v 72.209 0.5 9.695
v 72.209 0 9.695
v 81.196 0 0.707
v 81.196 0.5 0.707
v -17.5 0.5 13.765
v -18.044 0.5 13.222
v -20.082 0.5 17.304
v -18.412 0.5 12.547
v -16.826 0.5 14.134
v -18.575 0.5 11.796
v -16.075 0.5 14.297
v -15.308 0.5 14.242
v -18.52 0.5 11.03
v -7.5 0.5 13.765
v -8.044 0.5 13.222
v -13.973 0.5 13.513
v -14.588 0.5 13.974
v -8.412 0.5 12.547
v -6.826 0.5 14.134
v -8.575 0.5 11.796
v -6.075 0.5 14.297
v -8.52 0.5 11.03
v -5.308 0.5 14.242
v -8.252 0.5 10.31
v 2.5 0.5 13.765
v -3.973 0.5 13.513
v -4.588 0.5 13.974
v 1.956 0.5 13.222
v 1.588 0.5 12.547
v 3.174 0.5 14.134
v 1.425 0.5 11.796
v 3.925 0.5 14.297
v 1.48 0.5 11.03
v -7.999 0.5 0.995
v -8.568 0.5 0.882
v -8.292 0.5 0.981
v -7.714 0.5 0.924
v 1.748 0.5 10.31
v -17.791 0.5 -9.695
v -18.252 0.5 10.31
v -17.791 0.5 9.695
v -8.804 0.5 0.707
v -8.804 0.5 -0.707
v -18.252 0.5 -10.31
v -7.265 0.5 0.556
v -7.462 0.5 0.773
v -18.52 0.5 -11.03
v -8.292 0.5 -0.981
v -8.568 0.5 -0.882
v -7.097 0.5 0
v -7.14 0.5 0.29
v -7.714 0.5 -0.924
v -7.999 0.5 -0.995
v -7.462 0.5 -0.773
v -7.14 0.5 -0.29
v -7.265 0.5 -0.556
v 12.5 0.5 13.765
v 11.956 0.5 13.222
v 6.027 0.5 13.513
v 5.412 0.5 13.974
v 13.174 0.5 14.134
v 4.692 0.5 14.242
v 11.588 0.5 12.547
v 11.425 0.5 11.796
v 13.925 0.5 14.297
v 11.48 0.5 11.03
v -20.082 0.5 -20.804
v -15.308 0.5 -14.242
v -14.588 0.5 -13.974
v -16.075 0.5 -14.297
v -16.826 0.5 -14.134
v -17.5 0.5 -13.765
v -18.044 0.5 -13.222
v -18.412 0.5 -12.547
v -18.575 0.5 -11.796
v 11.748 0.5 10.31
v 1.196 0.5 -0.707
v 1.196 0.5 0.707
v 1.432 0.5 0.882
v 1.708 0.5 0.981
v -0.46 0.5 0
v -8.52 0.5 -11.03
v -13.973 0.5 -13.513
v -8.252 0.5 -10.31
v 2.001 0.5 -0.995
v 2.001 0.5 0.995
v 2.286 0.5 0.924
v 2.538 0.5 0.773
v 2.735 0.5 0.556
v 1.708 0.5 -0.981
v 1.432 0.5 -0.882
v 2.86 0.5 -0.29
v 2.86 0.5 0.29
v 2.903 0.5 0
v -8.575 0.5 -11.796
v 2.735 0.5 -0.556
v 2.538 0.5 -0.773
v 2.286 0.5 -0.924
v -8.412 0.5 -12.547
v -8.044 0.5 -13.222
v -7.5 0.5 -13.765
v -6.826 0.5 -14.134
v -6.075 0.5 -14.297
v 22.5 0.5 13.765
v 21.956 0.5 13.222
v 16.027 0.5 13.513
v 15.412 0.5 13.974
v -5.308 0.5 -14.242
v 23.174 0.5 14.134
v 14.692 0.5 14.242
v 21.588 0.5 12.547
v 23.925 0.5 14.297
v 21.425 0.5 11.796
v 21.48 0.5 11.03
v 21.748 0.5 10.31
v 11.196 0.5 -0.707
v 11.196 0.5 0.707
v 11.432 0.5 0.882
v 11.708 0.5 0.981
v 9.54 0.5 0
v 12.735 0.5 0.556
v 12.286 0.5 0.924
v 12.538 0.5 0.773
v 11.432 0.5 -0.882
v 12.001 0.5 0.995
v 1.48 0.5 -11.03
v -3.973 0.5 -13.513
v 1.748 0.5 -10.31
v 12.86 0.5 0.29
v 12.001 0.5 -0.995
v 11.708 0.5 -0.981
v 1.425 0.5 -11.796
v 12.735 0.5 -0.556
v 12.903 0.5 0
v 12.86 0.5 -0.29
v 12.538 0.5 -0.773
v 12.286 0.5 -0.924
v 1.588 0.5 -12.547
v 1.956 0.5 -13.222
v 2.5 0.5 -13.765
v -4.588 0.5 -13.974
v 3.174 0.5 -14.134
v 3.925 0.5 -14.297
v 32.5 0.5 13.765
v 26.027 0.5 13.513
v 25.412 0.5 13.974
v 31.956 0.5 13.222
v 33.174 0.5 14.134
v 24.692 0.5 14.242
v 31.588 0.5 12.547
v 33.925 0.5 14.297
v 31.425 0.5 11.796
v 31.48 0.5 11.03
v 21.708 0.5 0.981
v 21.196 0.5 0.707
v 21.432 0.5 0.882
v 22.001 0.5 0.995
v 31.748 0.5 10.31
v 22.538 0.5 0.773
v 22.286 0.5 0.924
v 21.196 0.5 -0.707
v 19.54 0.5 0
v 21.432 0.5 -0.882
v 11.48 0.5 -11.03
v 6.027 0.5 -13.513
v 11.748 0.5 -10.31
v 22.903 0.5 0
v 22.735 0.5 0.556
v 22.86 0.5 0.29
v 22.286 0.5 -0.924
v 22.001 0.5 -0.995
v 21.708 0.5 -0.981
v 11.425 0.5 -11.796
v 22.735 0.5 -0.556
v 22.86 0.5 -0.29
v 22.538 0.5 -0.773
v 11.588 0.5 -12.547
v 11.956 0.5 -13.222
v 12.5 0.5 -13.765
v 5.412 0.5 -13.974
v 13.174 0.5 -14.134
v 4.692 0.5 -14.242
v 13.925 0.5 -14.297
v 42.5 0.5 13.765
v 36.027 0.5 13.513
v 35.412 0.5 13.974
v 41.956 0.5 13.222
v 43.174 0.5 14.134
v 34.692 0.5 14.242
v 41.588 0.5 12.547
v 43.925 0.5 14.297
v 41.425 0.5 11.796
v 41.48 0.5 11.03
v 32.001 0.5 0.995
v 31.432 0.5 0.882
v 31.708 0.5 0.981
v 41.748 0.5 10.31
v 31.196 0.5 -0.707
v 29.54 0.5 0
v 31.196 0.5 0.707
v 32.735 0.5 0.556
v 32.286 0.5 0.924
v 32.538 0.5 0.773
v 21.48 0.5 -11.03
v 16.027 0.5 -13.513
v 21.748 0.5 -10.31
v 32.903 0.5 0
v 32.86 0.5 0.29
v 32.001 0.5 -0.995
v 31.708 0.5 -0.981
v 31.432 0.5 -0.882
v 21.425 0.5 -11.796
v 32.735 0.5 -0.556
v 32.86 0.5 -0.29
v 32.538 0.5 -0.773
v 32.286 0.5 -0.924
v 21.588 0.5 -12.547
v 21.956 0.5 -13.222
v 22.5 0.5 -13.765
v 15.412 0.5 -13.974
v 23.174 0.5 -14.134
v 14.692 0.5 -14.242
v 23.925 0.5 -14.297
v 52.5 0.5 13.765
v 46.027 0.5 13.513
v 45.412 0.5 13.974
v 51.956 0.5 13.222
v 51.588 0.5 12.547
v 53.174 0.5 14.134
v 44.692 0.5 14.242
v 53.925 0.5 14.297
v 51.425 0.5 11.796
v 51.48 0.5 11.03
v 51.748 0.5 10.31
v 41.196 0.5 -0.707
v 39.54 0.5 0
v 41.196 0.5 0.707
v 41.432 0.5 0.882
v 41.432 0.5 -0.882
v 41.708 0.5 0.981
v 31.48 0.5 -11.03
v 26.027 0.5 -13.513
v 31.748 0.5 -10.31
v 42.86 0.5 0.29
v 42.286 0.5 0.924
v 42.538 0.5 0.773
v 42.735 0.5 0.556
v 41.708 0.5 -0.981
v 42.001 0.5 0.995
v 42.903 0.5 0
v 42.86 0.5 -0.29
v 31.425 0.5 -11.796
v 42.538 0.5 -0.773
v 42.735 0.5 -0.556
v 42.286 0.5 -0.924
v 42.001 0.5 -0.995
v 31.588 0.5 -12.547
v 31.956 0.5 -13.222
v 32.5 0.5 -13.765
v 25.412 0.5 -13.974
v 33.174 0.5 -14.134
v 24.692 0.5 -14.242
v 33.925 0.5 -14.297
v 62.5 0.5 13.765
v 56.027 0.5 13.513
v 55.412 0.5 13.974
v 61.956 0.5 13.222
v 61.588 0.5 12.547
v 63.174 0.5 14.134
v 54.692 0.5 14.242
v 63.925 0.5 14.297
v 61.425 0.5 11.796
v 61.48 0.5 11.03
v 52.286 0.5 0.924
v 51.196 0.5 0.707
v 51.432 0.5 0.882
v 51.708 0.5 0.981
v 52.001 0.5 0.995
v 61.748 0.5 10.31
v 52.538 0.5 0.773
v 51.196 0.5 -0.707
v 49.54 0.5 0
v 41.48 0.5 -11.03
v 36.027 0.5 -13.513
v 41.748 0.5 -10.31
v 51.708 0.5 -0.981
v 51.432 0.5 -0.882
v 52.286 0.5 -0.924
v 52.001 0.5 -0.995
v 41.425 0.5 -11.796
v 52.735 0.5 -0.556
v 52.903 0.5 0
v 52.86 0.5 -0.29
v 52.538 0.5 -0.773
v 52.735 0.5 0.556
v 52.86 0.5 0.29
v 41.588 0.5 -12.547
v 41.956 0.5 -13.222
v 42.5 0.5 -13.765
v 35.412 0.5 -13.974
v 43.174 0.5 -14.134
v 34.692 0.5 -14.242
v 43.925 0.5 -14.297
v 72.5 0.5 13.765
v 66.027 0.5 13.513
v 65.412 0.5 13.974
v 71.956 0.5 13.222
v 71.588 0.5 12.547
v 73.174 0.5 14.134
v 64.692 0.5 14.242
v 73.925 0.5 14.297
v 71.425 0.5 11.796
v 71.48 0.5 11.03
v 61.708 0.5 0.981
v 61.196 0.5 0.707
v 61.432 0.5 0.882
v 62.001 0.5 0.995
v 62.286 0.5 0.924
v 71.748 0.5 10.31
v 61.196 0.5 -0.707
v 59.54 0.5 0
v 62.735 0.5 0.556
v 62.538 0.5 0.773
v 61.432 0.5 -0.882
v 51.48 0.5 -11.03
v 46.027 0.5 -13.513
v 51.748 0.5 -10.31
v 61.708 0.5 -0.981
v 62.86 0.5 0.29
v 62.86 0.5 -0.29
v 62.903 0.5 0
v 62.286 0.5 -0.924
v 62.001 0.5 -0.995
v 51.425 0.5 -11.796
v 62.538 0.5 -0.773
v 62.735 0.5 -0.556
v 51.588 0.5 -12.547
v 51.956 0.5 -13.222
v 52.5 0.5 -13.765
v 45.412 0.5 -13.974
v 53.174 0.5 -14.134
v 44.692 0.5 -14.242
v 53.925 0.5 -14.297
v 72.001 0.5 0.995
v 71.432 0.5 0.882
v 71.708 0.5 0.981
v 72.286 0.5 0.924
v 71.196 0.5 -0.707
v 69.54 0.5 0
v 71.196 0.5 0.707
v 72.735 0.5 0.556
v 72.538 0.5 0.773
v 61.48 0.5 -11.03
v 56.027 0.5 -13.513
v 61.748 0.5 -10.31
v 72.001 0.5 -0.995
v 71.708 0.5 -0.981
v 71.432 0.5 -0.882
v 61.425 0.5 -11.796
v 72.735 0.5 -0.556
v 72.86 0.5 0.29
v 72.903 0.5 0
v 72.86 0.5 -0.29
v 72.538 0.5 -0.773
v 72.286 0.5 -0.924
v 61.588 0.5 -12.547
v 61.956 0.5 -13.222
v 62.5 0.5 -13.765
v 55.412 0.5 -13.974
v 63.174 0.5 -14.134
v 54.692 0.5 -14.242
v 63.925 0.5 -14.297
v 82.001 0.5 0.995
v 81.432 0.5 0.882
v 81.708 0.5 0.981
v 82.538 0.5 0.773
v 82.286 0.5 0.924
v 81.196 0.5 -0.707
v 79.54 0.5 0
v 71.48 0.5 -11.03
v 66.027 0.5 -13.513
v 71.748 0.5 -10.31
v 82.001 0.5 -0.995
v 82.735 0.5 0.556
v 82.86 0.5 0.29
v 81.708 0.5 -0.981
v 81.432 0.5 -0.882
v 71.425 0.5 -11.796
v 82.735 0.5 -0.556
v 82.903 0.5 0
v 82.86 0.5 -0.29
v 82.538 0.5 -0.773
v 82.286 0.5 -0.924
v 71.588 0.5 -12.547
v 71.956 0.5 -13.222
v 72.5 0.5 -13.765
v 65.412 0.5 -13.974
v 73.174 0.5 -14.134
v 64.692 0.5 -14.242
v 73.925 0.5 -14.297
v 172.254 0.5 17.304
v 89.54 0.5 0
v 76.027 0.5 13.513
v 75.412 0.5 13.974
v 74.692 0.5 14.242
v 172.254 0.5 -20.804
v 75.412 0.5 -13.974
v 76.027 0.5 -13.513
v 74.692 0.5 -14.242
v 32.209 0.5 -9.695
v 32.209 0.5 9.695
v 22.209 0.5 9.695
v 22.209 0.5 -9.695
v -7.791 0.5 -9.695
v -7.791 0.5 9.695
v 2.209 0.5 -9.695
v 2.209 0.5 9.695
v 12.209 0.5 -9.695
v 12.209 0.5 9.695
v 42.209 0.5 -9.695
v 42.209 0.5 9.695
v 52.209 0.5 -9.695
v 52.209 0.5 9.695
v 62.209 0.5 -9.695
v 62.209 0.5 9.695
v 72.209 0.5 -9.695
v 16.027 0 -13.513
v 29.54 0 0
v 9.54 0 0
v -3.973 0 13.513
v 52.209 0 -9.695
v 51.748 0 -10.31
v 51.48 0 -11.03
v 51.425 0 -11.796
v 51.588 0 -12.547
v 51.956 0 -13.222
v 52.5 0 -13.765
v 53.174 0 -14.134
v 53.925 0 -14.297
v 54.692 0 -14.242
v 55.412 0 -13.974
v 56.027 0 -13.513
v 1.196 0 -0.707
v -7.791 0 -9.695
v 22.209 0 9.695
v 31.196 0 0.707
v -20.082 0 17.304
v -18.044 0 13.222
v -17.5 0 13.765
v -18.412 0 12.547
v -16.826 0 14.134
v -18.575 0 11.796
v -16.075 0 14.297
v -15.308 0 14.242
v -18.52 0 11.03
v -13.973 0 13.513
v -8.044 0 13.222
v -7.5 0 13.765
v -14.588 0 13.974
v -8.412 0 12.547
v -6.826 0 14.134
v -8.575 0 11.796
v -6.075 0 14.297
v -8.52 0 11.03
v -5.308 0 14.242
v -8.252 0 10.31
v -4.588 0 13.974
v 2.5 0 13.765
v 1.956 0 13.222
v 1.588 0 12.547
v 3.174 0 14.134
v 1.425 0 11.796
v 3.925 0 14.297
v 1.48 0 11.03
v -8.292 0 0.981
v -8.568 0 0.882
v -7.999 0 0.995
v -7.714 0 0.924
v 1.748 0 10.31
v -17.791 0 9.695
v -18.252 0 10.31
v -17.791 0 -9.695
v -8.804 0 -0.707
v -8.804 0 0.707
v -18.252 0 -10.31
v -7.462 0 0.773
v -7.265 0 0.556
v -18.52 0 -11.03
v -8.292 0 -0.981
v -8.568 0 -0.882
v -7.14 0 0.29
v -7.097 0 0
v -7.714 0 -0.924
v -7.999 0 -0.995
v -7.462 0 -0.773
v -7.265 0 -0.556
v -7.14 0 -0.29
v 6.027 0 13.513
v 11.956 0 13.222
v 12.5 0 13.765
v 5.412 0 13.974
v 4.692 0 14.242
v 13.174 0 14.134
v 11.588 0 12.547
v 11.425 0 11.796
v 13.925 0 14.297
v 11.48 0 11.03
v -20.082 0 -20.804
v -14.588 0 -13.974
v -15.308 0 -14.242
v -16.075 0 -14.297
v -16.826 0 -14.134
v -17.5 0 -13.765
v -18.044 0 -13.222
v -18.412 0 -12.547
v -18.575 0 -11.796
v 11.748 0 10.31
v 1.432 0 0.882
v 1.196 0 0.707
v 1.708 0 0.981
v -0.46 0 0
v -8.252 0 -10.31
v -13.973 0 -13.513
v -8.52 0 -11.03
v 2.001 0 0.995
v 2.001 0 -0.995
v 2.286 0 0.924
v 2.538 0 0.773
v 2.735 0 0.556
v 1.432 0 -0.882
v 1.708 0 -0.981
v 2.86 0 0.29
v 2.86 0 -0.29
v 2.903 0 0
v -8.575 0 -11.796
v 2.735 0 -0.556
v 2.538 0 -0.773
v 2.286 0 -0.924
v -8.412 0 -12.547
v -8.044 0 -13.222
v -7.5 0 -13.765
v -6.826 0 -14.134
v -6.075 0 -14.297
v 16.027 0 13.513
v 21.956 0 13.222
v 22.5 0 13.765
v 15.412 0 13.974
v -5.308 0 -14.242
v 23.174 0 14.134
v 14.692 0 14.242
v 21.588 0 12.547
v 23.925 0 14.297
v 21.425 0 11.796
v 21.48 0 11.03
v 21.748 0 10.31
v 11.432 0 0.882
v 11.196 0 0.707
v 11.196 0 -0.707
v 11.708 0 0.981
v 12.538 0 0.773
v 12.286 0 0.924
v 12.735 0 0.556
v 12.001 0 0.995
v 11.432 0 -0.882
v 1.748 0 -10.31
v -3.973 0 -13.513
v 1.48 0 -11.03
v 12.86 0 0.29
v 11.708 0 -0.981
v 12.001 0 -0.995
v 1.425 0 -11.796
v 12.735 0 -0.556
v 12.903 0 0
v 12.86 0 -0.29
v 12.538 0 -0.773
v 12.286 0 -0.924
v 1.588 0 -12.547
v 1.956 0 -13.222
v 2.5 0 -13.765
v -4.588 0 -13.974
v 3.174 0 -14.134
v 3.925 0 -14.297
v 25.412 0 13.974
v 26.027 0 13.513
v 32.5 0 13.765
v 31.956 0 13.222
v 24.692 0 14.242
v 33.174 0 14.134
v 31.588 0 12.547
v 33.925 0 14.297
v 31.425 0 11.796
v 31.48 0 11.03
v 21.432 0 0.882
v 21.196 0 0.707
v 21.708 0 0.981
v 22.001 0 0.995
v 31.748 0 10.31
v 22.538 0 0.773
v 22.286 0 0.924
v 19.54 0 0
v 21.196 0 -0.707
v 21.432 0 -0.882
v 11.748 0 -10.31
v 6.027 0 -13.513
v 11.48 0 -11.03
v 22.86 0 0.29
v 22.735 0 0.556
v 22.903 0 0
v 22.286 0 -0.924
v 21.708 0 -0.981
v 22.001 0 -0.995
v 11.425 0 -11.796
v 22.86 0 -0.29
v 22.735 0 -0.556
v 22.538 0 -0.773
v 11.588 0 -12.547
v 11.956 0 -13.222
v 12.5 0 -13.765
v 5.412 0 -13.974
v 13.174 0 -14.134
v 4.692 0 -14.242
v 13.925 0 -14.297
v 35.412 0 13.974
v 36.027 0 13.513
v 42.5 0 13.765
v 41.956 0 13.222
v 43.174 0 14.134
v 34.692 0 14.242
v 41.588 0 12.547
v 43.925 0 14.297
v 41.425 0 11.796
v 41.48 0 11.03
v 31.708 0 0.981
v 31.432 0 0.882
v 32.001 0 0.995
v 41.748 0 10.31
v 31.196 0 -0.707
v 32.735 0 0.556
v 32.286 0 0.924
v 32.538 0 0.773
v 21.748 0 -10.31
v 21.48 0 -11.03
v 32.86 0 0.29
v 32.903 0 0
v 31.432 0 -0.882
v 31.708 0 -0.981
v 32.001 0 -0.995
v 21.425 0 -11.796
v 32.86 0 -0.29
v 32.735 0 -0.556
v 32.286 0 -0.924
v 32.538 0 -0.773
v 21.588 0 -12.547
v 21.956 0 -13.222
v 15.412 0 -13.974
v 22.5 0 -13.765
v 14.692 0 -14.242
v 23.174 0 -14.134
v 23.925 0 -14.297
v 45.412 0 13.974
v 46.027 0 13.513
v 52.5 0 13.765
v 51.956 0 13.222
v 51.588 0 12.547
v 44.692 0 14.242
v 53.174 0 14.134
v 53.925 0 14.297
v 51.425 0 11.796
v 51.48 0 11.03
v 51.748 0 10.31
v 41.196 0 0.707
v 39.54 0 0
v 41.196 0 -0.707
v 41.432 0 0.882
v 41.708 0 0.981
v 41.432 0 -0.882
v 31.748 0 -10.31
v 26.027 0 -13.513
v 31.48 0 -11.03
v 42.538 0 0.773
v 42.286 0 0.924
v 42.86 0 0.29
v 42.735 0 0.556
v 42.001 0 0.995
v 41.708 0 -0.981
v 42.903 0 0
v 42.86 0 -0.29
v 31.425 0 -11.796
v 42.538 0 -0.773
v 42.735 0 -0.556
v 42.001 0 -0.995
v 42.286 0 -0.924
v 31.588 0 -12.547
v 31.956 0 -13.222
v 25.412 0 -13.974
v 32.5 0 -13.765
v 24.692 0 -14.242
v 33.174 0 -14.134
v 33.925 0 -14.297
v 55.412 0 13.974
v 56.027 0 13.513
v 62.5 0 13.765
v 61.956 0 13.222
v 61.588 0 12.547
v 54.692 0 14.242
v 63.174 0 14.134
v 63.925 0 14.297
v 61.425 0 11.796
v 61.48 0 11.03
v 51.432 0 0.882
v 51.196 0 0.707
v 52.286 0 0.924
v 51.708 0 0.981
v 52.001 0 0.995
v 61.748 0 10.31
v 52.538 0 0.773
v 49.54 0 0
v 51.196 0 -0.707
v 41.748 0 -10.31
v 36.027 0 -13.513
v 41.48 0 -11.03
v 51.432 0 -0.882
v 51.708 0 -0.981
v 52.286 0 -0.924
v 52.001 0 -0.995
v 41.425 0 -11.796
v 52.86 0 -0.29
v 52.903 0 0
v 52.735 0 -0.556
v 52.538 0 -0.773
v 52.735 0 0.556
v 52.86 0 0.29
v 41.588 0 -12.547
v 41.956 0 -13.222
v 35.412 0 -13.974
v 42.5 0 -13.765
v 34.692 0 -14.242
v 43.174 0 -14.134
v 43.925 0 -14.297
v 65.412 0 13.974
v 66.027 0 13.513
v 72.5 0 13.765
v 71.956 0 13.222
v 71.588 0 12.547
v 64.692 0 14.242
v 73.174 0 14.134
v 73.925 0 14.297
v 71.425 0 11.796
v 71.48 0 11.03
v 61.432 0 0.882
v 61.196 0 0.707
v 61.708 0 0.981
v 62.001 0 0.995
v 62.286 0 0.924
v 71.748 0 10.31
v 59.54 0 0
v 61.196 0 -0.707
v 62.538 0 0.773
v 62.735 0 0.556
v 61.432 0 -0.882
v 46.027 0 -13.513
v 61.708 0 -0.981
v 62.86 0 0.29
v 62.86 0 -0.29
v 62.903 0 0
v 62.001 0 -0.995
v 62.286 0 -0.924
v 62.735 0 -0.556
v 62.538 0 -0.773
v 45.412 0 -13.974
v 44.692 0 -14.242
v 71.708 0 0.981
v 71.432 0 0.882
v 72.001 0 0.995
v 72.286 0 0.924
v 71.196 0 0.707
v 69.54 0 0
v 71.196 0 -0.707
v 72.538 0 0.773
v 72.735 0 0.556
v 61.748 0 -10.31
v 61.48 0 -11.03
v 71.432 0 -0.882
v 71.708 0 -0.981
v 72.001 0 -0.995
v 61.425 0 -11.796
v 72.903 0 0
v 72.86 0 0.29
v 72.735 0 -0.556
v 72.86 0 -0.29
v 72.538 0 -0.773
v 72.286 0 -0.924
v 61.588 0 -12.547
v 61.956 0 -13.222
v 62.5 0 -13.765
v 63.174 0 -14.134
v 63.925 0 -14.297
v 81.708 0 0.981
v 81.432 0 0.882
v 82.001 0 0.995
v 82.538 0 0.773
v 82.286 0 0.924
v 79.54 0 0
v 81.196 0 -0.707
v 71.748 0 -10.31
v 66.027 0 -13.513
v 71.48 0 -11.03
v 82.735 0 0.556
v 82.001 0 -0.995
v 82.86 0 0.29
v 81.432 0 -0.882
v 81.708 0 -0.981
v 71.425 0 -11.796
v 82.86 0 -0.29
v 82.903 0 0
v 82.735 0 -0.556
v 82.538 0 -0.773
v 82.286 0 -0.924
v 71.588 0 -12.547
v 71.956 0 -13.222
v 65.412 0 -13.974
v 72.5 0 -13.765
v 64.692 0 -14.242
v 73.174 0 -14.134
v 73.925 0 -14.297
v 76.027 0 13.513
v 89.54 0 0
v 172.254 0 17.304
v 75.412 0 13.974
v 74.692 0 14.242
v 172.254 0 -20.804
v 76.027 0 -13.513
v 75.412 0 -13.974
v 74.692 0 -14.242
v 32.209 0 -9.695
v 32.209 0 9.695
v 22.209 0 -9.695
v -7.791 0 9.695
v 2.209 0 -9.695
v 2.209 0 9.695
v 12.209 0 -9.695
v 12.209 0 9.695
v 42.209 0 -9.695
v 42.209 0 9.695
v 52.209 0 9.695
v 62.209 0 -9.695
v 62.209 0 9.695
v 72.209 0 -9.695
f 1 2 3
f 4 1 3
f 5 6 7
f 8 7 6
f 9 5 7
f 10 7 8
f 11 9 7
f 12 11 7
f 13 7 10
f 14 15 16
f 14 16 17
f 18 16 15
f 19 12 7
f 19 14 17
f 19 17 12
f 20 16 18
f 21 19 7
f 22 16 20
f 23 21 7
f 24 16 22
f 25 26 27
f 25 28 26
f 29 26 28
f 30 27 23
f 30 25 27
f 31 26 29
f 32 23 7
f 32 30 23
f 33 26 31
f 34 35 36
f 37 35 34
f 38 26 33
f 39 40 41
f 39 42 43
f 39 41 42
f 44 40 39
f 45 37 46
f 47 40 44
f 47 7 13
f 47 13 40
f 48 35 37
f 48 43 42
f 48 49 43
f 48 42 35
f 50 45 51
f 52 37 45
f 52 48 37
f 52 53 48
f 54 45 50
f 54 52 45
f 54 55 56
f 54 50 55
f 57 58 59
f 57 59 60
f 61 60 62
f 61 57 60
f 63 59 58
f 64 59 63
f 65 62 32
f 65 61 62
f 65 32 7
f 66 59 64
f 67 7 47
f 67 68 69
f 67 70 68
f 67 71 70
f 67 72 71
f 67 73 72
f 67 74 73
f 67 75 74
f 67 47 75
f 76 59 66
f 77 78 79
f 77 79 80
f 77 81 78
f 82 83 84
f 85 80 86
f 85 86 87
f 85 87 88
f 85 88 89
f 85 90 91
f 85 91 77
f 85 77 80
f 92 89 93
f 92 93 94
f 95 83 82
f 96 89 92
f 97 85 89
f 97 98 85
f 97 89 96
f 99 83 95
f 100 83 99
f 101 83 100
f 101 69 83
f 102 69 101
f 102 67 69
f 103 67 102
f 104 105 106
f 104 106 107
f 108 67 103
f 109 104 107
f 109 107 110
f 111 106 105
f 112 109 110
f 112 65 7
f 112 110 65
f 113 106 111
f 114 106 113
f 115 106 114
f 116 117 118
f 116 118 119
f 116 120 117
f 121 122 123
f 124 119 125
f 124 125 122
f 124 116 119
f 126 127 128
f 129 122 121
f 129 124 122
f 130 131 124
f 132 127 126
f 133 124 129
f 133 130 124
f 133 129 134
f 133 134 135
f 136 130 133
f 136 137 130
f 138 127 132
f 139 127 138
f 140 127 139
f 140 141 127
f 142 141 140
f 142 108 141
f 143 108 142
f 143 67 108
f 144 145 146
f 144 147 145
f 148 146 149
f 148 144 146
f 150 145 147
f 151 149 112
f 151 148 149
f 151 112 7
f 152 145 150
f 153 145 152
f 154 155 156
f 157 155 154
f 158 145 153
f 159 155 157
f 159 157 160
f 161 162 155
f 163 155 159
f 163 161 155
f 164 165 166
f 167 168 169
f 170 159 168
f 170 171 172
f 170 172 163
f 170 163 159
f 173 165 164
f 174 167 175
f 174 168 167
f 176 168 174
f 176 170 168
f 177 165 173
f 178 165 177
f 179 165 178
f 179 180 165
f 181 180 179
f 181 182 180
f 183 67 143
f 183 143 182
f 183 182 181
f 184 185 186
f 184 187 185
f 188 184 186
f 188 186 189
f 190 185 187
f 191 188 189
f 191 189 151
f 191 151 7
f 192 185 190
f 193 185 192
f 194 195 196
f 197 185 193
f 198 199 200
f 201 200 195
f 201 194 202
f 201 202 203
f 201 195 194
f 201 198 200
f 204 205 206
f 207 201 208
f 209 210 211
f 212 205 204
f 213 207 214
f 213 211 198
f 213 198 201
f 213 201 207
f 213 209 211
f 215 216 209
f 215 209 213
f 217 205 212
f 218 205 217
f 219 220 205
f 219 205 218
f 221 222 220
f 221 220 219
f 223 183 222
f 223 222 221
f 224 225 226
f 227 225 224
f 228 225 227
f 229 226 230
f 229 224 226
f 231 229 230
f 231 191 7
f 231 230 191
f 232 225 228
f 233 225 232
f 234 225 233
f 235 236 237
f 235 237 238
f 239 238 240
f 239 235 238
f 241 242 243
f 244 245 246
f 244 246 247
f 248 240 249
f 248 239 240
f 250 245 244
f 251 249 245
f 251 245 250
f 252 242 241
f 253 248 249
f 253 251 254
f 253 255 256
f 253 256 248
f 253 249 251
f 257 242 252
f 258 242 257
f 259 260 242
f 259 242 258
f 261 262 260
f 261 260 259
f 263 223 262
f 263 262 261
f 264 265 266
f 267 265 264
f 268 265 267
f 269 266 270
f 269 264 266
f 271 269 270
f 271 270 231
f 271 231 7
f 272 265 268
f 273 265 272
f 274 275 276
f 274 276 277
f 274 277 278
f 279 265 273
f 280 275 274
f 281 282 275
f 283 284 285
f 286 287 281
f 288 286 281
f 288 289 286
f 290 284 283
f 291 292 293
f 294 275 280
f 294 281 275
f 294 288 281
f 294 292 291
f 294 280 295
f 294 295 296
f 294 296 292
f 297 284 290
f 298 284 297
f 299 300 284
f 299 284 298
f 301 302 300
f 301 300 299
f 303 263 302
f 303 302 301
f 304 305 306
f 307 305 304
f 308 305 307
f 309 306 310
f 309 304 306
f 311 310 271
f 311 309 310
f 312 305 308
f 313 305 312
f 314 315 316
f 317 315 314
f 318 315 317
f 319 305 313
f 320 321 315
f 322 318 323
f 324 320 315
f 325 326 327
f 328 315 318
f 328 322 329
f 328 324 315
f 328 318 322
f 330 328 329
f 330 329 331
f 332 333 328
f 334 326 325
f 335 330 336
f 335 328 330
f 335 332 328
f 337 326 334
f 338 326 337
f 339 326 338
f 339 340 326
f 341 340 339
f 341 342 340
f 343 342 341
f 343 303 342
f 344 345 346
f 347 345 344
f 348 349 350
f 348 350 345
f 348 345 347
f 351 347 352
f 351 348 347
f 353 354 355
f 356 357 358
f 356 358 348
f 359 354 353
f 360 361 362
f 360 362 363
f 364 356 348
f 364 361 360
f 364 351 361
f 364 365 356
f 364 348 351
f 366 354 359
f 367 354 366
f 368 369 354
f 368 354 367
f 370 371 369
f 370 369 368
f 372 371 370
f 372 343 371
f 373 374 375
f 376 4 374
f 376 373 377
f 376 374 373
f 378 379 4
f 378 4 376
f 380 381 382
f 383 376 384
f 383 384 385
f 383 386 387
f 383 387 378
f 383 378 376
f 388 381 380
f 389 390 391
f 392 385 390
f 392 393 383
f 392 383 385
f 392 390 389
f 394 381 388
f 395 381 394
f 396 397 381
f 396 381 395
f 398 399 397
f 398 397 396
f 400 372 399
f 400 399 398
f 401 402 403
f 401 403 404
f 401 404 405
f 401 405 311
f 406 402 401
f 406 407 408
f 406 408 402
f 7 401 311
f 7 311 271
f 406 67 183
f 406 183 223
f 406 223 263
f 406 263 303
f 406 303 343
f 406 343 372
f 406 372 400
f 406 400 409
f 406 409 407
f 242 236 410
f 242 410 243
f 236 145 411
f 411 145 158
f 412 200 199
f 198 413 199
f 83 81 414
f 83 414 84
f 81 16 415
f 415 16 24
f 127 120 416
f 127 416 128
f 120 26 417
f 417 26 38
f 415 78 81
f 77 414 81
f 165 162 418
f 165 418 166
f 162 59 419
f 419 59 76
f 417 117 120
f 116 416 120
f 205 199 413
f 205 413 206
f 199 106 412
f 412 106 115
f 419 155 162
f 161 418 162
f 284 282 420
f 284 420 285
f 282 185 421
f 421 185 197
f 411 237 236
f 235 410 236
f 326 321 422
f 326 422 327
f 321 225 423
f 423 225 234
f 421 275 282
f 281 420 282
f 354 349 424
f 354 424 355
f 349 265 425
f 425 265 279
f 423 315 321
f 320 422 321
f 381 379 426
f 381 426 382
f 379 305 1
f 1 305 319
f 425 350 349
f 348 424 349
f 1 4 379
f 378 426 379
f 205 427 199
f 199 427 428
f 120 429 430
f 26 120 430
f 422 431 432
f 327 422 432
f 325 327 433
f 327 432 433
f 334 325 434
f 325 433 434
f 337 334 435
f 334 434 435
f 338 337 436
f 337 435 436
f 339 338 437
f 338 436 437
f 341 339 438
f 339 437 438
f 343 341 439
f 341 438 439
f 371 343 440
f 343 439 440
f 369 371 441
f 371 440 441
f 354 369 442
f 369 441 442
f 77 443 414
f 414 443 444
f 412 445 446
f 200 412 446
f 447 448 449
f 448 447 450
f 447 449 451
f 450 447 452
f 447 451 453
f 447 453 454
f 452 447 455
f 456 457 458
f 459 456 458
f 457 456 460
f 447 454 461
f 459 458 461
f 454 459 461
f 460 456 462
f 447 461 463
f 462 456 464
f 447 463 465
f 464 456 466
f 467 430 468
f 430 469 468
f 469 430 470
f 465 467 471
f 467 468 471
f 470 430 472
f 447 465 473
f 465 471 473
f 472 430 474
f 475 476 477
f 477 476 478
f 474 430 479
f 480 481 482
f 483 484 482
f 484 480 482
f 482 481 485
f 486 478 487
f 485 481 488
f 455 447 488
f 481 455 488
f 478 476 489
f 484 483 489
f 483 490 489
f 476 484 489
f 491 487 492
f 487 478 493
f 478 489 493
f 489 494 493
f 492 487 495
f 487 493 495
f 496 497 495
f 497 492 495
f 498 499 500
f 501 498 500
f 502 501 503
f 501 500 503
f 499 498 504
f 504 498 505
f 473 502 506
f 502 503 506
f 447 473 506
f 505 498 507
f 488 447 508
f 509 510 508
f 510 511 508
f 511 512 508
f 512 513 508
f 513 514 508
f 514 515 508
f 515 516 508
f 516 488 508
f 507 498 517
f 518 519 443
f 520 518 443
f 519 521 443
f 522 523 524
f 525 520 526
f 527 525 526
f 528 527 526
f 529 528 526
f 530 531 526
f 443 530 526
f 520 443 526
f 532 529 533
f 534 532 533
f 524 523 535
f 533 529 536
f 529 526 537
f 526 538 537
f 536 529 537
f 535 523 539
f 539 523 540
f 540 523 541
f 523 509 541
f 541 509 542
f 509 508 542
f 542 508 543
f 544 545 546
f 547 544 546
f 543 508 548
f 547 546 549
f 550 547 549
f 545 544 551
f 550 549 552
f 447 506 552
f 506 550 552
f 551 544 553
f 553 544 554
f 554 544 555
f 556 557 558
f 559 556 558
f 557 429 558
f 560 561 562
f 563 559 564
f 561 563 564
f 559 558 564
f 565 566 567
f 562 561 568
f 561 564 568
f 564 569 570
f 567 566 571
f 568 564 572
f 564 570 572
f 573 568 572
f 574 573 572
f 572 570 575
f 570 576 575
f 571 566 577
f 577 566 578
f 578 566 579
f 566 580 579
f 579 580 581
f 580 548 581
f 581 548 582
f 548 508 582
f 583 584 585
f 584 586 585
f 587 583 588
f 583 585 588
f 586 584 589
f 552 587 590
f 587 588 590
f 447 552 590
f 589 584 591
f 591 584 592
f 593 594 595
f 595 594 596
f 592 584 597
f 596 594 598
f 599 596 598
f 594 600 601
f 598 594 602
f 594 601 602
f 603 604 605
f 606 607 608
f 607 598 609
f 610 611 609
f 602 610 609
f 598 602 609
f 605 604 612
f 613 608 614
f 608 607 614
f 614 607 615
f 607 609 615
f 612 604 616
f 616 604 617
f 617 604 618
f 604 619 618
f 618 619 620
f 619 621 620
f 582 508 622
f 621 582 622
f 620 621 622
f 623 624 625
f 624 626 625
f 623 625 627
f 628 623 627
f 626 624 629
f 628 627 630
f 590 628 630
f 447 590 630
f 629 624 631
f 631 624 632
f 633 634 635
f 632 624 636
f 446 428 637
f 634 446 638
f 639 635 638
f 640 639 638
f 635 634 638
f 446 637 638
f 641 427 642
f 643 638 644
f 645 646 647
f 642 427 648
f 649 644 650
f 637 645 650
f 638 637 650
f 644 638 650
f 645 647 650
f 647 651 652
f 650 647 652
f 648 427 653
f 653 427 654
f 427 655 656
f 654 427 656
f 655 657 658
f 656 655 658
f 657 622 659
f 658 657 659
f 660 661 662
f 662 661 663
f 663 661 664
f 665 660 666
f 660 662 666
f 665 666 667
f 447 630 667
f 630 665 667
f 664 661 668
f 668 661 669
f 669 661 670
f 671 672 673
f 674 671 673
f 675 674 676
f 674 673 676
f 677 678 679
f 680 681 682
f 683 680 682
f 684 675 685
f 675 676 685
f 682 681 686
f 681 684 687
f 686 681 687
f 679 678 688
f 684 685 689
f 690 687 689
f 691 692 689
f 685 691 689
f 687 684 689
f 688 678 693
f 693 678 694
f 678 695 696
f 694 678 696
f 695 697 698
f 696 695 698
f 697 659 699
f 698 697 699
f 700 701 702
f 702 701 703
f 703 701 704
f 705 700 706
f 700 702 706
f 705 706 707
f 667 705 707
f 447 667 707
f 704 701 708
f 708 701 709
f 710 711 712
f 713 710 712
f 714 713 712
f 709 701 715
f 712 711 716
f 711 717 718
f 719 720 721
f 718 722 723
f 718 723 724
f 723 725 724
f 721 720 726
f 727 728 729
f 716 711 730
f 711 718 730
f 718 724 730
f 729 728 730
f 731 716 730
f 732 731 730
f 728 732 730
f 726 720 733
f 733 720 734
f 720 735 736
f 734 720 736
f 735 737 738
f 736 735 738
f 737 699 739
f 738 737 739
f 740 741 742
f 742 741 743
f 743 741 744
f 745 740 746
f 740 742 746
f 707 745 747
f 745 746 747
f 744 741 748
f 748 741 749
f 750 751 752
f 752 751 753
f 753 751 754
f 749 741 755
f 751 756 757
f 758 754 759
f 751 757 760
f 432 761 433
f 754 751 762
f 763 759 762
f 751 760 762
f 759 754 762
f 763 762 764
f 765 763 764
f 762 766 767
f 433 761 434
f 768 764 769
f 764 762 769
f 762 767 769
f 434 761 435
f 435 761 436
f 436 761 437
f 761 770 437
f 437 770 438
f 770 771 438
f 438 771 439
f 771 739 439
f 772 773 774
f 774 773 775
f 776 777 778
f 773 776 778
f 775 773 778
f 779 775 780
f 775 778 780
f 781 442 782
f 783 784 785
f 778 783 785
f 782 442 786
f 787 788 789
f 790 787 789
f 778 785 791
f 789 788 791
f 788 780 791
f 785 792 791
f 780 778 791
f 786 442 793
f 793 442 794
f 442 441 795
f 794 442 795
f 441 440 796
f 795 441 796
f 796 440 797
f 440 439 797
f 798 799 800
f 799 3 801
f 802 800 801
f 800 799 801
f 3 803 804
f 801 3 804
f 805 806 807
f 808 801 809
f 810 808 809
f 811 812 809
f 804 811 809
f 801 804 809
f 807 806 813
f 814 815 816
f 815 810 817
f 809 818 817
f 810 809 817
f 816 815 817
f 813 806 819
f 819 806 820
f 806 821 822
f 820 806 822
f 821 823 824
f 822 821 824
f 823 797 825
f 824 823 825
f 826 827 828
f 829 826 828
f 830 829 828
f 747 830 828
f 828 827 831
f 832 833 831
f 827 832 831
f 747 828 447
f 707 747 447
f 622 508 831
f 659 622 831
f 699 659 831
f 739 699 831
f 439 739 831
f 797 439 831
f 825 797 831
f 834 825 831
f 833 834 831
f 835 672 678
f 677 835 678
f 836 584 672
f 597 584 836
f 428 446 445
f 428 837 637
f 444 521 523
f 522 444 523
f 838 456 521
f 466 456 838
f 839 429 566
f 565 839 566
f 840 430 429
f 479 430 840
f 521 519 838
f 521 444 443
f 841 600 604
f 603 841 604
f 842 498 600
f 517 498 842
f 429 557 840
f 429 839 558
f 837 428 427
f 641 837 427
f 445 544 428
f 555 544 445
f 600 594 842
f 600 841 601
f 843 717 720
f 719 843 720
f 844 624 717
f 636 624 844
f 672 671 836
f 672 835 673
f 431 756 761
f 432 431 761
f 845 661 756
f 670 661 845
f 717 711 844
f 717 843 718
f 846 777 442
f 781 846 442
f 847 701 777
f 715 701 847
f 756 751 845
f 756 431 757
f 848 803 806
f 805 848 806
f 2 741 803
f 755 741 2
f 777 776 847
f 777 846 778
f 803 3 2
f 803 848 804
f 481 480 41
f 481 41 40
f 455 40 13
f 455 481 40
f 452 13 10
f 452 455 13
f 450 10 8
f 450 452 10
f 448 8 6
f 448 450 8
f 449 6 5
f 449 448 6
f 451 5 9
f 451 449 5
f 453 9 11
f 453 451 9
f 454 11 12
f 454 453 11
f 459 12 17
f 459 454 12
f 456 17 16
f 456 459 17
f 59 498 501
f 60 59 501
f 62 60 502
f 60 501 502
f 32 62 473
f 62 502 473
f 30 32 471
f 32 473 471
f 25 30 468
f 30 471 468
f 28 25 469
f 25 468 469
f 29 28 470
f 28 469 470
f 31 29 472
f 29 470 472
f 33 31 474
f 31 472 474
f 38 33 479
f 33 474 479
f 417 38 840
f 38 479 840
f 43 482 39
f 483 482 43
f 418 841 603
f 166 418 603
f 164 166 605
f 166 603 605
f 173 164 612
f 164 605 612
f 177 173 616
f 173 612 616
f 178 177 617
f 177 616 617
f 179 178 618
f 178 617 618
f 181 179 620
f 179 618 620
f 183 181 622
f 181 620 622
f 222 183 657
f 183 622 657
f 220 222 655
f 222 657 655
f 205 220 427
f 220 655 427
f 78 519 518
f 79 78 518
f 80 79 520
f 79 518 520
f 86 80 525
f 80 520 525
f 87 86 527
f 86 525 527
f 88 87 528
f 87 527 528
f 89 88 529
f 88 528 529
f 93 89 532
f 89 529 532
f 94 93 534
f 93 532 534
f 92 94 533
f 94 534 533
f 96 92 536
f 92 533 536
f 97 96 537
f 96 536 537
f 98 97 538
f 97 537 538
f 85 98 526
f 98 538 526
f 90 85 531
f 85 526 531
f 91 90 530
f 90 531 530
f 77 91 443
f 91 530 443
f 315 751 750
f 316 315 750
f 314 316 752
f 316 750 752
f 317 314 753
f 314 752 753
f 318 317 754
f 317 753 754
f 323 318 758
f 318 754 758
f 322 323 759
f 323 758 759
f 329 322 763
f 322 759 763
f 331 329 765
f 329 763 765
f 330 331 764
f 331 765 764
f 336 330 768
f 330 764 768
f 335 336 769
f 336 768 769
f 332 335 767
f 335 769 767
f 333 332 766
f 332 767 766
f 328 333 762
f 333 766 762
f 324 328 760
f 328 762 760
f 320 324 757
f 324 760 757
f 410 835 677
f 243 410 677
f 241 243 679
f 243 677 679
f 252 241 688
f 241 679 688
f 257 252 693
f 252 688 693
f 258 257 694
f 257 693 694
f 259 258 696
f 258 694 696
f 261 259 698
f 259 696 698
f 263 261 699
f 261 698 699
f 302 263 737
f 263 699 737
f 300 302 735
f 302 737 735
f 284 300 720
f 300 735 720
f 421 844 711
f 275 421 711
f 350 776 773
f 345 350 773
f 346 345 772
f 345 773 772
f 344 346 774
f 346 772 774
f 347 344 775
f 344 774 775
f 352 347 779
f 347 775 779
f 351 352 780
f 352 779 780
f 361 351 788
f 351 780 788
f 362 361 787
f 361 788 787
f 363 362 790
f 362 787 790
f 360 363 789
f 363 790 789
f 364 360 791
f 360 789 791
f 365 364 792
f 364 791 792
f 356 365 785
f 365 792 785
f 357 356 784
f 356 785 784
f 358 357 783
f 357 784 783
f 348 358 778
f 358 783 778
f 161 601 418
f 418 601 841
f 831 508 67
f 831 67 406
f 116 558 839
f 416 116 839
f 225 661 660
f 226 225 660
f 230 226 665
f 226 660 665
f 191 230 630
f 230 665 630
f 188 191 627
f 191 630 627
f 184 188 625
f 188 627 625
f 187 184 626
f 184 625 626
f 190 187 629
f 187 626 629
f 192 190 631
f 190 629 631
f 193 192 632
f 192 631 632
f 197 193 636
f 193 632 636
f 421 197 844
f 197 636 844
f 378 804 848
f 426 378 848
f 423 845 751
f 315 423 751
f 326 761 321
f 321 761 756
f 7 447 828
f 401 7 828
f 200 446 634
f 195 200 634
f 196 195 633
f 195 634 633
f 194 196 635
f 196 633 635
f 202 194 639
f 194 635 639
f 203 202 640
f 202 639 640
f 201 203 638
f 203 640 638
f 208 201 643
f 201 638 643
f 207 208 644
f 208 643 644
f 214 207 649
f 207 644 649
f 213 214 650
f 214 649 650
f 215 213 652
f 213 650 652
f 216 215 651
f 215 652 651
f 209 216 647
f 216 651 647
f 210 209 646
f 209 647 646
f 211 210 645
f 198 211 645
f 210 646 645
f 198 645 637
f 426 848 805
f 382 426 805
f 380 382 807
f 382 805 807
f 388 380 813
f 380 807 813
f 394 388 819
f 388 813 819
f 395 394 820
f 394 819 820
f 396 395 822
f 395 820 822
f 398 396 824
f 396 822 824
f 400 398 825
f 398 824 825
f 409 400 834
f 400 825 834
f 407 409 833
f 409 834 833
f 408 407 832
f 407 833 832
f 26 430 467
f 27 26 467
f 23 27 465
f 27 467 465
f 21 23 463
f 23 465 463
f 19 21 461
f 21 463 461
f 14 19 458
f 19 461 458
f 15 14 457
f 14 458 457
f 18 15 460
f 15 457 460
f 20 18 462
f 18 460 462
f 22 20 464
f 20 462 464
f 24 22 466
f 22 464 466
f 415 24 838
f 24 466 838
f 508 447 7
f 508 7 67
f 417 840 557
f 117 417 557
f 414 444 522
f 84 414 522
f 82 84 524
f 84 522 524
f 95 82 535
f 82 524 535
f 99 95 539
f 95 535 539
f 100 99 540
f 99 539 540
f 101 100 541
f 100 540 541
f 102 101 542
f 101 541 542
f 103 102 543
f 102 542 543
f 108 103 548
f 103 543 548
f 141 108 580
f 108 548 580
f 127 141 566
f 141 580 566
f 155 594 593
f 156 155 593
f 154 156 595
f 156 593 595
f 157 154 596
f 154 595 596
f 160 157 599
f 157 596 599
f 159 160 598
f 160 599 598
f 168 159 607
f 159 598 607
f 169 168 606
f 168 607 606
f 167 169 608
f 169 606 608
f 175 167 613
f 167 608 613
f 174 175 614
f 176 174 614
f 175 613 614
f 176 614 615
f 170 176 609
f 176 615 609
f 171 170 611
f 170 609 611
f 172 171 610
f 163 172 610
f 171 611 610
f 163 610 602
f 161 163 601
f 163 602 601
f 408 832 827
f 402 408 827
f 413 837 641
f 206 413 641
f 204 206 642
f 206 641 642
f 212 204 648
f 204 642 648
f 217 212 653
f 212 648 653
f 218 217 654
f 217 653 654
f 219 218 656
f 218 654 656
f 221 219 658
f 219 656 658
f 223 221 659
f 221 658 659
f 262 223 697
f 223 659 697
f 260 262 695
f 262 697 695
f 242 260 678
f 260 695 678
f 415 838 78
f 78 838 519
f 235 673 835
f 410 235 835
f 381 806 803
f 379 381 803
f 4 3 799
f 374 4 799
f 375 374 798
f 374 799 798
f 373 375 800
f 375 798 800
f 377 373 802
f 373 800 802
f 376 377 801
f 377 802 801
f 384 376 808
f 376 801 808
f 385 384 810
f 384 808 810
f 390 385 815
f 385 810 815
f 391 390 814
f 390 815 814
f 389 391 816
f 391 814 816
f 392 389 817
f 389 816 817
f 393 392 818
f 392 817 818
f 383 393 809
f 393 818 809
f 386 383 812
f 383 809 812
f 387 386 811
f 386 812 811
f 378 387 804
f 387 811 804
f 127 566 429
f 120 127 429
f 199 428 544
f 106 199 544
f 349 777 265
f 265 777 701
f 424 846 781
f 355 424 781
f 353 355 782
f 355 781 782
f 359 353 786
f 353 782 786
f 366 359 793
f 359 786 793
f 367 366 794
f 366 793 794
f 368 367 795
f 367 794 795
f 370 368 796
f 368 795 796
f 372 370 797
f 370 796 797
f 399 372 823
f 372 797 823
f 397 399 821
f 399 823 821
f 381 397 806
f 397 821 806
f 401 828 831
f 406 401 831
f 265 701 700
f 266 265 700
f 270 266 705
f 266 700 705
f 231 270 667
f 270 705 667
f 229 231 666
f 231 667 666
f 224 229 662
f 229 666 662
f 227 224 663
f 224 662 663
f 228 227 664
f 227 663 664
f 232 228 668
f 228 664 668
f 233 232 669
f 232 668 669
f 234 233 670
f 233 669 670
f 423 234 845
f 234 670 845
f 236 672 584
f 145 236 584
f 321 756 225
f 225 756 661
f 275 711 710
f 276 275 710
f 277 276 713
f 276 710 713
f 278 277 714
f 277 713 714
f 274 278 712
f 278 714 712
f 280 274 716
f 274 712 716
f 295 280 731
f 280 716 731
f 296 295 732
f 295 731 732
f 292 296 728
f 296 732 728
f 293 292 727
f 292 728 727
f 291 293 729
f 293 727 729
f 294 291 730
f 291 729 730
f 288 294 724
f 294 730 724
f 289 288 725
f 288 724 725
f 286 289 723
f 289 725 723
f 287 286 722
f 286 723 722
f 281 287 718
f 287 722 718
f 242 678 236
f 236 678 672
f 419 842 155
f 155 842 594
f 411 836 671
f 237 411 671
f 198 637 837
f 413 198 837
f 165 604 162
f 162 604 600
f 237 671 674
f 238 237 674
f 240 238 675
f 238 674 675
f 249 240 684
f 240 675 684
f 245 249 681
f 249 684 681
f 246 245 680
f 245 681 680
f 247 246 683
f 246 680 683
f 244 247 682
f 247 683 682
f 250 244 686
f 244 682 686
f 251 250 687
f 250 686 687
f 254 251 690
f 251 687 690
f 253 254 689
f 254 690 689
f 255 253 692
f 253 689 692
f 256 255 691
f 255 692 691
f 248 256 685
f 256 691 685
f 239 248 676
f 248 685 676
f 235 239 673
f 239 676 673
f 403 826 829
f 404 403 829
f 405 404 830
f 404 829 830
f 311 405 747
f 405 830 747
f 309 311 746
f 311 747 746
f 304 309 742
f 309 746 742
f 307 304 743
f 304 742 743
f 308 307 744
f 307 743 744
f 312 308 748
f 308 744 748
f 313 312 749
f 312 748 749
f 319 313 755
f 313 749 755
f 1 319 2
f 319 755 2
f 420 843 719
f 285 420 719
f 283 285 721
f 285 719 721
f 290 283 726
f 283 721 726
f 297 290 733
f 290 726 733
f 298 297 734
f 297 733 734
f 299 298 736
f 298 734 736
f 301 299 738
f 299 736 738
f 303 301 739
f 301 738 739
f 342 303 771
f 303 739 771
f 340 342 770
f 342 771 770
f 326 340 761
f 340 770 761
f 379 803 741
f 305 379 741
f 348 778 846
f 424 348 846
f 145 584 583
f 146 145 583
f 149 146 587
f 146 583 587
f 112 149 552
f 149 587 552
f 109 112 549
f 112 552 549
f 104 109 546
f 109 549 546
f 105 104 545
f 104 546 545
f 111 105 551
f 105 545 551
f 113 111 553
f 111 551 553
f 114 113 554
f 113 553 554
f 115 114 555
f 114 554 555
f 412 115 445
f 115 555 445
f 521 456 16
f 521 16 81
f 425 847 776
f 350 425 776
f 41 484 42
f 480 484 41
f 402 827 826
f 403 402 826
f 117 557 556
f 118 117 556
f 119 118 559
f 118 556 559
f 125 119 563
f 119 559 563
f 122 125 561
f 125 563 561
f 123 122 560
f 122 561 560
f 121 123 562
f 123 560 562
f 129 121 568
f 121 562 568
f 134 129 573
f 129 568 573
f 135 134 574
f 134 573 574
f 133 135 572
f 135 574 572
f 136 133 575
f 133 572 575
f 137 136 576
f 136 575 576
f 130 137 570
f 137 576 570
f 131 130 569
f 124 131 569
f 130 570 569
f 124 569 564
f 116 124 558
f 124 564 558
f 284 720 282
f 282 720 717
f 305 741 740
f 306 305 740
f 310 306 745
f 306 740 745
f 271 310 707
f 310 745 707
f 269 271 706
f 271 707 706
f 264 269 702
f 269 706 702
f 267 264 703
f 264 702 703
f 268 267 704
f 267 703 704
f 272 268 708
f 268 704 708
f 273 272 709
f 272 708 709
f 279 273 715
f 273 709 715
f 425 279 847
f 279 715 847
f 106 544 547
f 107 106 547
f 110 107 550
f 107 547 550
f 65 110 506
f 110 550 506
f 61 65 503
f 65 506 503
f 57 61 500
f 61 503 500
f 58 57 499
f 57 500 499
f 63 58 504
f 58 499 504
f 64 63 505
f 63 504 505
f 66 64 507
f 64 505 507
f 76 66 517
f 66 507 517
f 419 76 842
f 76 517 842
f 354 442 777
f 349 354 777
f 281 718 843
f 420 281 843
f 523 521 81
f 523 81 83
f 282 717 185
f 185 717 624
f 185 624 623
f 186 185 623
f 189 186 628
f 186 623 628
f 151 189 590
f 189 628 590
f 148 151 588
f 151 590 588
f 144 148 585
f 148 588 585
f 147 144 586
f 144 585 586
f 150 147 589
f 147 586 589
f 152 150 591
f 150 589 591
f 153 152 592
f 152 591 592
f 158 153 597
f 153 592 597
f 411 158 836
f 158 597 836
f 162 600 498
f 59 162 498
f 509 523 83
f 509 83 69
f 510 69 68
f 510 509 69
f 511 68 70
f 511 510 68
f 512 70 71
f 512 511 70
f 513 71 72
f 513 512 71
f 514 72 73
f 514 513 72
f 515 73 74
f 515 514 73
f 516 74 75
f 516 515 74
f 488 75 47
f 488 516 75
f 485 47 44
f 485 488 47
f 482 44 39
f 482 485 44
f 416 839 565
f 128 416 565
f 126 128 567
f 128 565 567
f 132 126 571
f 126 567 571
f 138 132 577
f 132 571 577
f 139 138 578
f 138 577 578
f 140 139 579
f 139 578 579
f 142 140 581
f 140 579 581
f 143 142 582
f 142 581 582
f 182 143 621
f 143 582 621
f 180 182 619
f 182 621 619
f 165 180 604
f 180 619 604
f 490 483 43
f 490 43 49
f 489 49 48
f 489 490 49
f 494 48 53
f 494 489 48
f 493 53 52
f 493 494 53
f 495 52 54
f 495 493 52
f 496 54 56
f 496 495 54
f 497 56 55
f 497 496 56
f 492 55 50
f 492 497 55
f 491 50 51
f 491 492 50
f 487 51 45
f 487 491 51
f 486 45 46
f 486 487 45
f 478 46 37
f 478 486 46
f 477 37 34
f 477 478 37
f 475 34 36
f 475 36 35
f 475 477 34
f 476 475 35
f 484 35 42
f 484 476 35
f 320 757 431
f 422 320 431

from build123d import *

# Parameters (mm, degrees)
SKETCH1_W           = 192.336493245
SKETCH1_H           = 38.107536872
BOSS_EXTRUDE1_DEPTH = 0.5


with BuildPart() as part:
    # Sketch1 → Boss-Extrude1 (new body)
    with BuildSketch(Plane(origin=(0, 0, 0), x_dir=(1, 0, 0), z_dir=(0, 1, 0))):
        with Locations((76.086163536, 1.75)):
            Rectangle(SKETCH1_W, SKETCH1_H)
        with BuildLine():
            Line((-17.791271396, 9.694580127), (-8.803798051, 0.707106781))
            ThreePointArc((-8.803798051, 0.707106781), (-7.096691269, 0), (-8.803798051, -0.707106781))
            Line((-8.803798051, -0.707106781), (-17.791271396, -9.694580127))
            ThreePointArc((-17.791271396, -9.694580127), (-17.791271396, -13.512956745), (-13.972894778, -13.512956745))
            Line((-13.972894778, -13.512956745), (-0.459938033, 0))
            Line((-0.459938033, 0), (-13.972894778, 13.512956745))
            ThreePointArc((-13.972894778, 13.512956745), (-17.791271396, 13.512956745), (-17.791271396, 9.694580127))
        make_face(mode=Mode.SUBTRACT)
        with BuildLine():
            Line((-3.972894778, 13.512956745), (9.540061967, 0))
            Line((9.540061967, 0), (-3.972894778, -13.512956745))
            ThreePointArc((-3.972894778, -13.512956745), (-7.791271396, -13.512956745), (-7.791271396, -9.694580127))
            Line((-7.791271396, -9.694580127), (1.196201949, -0.707106781))
            ThreePointArc((1.196201949, -0.707106781), (2.903308731, 0), (1.196201949, 0.707106781))
            Line((1.196201949, 0.707106781), (-7.791271396, 9.694580127))
            ThreePointArc((-7.791271396, 9.694580127), (-7.791271396, 13.512956745), (-3.972894778, 13.512956745))
        make_face(mode=Mode.SUBTRACT)
        with BuildLine():
            Line((6.027105222, 13.512956745), (19.540061967, 0))
            Line((19.540061967, 0), (6.027105222, -13.512956745))
            ThreePointArc((6.027105222, -13.512956745), (2.208728604, -13.512956745), (2.208728604, -9.694580127))
            Line((2.208728604, -9.694580127), (11.196201949, -0.707106781))
            ThreePointArc((11.196201949, -0.707106781), (12.903308731, 0), (11.196201949, 0.707106781))
            Line((11.196201949, 0.707106781), (2.208728604, 9.694580127))
            ThreePointArc((2.208728604, 9.694580127), (2.208728604, 13.512956745), (6.027105222, 13.512956745))
        make_face(mode=Mode.SUBTRACT)
        with BuildLine():
            Line((16.027105222, 13.512956745), (29.540061967, 0))
            Line((29.540061967, 0), (16.027105222, -13.512956745))
            ThreePointArc((16.027105222, -13.512956745), (12.208728604, -13.512956745), (12.208728604, -9.694580127))
            Line((12.208728604, -9.694580127), (21.196201949, -0.707106781))
            ThreePointArc((21.196201949, -0.707106781), (22.903308731, 0), (21.196201949, 0.707106781))
            Line((21.196201949, 0.707106781), (12.208728604, 9.694580127))
            ThreePointArc((12.208728604, 9.694580127), (12.208728604, 13.512956745), (16.027105222, 13.512956745))
        make_face(mode=Mode.SUBTRACT)
        with BuildLine():
            Line((26.027105222, 13.512956745), (39.540061967, 0))
            Line((39.540061967, 0), (26.027105222, -13.512956745))
            ThreePointArc((26.027105222, -13.512956745), (22.208728604, -13.512956745), (22.208728604, -9.694580127))
            Line((22.208728604, -9.694580127), (31.196201949, -0.707106781))
            ThreePointArc((31.196201949, -0.707106781), (32.903308731, 0), (31.196201949, 0.707106781))
            Line((31.196201949, 0.707106781), (22.208728604, 9.694580127))
            ThreePointArc((22.208728604, 9.694580127), (22.208728604, 13.512956745), (26.027105222, 13.512956745))
        make_face(mode=Mode.SUBTRACT)
        with BuildLine():
            Line((36.027105222, 13.512956745), (49.540061967, 0))
            Line((49.540061967, 0), (36.027105222, -13.512956745))
            ThreePointArc((36.027105222, -13.512956745), (32.208728604, -13.512956745), (32.208728604, -9.694580127))
            Line((32.208728604, -9.694580127), (41.196201949, -0.707106781))
            ThreePointArc((41.196201949, -0.707106781), (42.903308731, 0), (41.196201949, 0.707106781))
            Line((41.196201949, 0.707106781), (32.208728604, 9.694580127))
            ThreePointArc((32.208728604, 9.694580127), (32.208728604, 13.512956745), (36.027105222, 13.512956745))
        make_face(mode=Mode.SUBTRACT)
        with BuildLine():
            Line((46.027105222, 13.512956745), (59.540061967, 0))
            Line((59.540061967, 0), (46.027105222, -13.512956745))
            ThreePointArc((46.027105222, -13.512956745), (42.208728604, -13.512956745), (42.208728604, -9.694580127))
            Line((42.208728604, -9.694580127), (51.196201949, -0.707106781))
            ThreePointArc((51.196201949, -0.707106781), (52.903308731, 0), (51.196201949, 0.707106781))
            Line((51.196201949, 0.707106781), (42.208728604, 9.694580127))
            ThreePointArc((42.208728604, 9.694580127), (42.208728604, 13.512956745), (46.027105222, 13.512956745))
        make_face(mode=Mode.SUBTRACT)
        with BuildLine():
            Line((56.027105222, 13.512956745), (69.540061967, 0))
            Line((69.540061967, 0), (56.027105222, -13.512956745))
            ThreePointArc((56.027105222, -13.512956745), (52.208728604, -13.512956745), (52.208728604, -9.694580127))
            Line((52.208728604, -9.694580127), (61.196201949, -0.707106781))
            ThreePointArc((61.196201949, -0.707106781), (62.903308731, 0), (61.196201949, 0.707106781))
            Line((61.196201949, 0.707106781), (52.208728604, 9.694580127))
            ThreePointArc((52.208728604, 9.694580127), (52.208728604, 13.512956745), (56.027105222, 13.512956745))
        make_face(mode=Mode.SUBTRACT)
        with BuildLine():
            Line((66.027105222, 13.512956745), (79.540061967, 0))
            Line((79.540061967, 0), (66.027105222, -13.512956745))
            ThreePointArc((66.027105222, -13.512956745), (62.208728604, -13.512956745), (62.208728604, -9.694580127))
            Line((62.208728604, -9.694580127), (71.196201949, -0.707106781))
            ThreePointArc((71.196201949, -0.707106781), (72.903308731, 0), (71.196201949, 0.707106781))
            Line((71.196201949, 0.707106781), (62.208728604, 9.694580127))
            ThreePointArc((62.208728604, 9.694580127), (62.208728604, 13.512956745), (66.027105222, 13.512956745))
        make_face(mode=Mode.SUBTRACT)
        with BuildLine():
            Line((76.027105222, 13.512956745), (89.540061967, 0))
            Line((89.540061967, 0), (76.027105222, -13.512956745))
            ThreePointArc((76.027105222, -13.512956745), (72.208728604, -13.512956745), (72.208728604, -9.694580127))
            Line((72.208728604, -9.694580127), (81.196201949, -0.707106781))
            ThreePointArc((81.196201949, -0.707106781), (82.903308731, 0), (81.196201949, 0.707106781))
            Line((81.196201949, 0.707106781), (72.208728604, 9.694580127))
            ThreePointArc((72.208728604, 9.694580127), (72.208728604, 13.512956745), (76.027105222, 13.512956745))
        make_face(mode=Mode.SUBTRACT)
    extrude(amount=BOSS_EXTRUDE1_DEPTH)


solid = part.part
